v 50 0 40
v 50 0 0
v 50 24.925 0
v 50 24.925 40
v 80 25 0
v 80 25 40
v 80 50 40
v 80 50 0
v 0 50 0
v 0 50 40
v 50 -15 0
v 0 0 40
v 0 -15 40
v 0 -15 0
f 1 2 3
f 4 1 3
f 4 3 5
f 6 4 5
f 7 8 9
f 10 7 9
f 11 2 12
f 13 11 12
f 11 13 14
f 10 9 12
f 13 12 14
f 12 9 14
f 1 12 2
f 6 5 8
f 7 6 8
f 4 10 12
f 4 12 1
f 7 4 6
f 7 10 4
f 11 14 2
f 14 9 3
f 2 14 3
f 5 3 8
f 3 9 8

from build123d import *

# Parameters (mm, degrees)
F1_DEPTH = 15
F3_DEPTH = 40


with BuildPart() as f1:
    # F0 (on Front) → F1 (new body)
    with BuildSketch(Plane.XZ):
        Polygon((0, 40), (0, 0), (50, 0), align=None)
    extrude(amount=F1_DEPTH)

    # F2 (on Top) → F3 (join)
    with BuildSketch(Plane.XY):
        Polygon((0, 50), (0, 0), (50, 0), (50, 24.924569), (80, 25), (80, 50), align=None)
    extrude(amount=F3_DEPTH)


solid = f1.part
